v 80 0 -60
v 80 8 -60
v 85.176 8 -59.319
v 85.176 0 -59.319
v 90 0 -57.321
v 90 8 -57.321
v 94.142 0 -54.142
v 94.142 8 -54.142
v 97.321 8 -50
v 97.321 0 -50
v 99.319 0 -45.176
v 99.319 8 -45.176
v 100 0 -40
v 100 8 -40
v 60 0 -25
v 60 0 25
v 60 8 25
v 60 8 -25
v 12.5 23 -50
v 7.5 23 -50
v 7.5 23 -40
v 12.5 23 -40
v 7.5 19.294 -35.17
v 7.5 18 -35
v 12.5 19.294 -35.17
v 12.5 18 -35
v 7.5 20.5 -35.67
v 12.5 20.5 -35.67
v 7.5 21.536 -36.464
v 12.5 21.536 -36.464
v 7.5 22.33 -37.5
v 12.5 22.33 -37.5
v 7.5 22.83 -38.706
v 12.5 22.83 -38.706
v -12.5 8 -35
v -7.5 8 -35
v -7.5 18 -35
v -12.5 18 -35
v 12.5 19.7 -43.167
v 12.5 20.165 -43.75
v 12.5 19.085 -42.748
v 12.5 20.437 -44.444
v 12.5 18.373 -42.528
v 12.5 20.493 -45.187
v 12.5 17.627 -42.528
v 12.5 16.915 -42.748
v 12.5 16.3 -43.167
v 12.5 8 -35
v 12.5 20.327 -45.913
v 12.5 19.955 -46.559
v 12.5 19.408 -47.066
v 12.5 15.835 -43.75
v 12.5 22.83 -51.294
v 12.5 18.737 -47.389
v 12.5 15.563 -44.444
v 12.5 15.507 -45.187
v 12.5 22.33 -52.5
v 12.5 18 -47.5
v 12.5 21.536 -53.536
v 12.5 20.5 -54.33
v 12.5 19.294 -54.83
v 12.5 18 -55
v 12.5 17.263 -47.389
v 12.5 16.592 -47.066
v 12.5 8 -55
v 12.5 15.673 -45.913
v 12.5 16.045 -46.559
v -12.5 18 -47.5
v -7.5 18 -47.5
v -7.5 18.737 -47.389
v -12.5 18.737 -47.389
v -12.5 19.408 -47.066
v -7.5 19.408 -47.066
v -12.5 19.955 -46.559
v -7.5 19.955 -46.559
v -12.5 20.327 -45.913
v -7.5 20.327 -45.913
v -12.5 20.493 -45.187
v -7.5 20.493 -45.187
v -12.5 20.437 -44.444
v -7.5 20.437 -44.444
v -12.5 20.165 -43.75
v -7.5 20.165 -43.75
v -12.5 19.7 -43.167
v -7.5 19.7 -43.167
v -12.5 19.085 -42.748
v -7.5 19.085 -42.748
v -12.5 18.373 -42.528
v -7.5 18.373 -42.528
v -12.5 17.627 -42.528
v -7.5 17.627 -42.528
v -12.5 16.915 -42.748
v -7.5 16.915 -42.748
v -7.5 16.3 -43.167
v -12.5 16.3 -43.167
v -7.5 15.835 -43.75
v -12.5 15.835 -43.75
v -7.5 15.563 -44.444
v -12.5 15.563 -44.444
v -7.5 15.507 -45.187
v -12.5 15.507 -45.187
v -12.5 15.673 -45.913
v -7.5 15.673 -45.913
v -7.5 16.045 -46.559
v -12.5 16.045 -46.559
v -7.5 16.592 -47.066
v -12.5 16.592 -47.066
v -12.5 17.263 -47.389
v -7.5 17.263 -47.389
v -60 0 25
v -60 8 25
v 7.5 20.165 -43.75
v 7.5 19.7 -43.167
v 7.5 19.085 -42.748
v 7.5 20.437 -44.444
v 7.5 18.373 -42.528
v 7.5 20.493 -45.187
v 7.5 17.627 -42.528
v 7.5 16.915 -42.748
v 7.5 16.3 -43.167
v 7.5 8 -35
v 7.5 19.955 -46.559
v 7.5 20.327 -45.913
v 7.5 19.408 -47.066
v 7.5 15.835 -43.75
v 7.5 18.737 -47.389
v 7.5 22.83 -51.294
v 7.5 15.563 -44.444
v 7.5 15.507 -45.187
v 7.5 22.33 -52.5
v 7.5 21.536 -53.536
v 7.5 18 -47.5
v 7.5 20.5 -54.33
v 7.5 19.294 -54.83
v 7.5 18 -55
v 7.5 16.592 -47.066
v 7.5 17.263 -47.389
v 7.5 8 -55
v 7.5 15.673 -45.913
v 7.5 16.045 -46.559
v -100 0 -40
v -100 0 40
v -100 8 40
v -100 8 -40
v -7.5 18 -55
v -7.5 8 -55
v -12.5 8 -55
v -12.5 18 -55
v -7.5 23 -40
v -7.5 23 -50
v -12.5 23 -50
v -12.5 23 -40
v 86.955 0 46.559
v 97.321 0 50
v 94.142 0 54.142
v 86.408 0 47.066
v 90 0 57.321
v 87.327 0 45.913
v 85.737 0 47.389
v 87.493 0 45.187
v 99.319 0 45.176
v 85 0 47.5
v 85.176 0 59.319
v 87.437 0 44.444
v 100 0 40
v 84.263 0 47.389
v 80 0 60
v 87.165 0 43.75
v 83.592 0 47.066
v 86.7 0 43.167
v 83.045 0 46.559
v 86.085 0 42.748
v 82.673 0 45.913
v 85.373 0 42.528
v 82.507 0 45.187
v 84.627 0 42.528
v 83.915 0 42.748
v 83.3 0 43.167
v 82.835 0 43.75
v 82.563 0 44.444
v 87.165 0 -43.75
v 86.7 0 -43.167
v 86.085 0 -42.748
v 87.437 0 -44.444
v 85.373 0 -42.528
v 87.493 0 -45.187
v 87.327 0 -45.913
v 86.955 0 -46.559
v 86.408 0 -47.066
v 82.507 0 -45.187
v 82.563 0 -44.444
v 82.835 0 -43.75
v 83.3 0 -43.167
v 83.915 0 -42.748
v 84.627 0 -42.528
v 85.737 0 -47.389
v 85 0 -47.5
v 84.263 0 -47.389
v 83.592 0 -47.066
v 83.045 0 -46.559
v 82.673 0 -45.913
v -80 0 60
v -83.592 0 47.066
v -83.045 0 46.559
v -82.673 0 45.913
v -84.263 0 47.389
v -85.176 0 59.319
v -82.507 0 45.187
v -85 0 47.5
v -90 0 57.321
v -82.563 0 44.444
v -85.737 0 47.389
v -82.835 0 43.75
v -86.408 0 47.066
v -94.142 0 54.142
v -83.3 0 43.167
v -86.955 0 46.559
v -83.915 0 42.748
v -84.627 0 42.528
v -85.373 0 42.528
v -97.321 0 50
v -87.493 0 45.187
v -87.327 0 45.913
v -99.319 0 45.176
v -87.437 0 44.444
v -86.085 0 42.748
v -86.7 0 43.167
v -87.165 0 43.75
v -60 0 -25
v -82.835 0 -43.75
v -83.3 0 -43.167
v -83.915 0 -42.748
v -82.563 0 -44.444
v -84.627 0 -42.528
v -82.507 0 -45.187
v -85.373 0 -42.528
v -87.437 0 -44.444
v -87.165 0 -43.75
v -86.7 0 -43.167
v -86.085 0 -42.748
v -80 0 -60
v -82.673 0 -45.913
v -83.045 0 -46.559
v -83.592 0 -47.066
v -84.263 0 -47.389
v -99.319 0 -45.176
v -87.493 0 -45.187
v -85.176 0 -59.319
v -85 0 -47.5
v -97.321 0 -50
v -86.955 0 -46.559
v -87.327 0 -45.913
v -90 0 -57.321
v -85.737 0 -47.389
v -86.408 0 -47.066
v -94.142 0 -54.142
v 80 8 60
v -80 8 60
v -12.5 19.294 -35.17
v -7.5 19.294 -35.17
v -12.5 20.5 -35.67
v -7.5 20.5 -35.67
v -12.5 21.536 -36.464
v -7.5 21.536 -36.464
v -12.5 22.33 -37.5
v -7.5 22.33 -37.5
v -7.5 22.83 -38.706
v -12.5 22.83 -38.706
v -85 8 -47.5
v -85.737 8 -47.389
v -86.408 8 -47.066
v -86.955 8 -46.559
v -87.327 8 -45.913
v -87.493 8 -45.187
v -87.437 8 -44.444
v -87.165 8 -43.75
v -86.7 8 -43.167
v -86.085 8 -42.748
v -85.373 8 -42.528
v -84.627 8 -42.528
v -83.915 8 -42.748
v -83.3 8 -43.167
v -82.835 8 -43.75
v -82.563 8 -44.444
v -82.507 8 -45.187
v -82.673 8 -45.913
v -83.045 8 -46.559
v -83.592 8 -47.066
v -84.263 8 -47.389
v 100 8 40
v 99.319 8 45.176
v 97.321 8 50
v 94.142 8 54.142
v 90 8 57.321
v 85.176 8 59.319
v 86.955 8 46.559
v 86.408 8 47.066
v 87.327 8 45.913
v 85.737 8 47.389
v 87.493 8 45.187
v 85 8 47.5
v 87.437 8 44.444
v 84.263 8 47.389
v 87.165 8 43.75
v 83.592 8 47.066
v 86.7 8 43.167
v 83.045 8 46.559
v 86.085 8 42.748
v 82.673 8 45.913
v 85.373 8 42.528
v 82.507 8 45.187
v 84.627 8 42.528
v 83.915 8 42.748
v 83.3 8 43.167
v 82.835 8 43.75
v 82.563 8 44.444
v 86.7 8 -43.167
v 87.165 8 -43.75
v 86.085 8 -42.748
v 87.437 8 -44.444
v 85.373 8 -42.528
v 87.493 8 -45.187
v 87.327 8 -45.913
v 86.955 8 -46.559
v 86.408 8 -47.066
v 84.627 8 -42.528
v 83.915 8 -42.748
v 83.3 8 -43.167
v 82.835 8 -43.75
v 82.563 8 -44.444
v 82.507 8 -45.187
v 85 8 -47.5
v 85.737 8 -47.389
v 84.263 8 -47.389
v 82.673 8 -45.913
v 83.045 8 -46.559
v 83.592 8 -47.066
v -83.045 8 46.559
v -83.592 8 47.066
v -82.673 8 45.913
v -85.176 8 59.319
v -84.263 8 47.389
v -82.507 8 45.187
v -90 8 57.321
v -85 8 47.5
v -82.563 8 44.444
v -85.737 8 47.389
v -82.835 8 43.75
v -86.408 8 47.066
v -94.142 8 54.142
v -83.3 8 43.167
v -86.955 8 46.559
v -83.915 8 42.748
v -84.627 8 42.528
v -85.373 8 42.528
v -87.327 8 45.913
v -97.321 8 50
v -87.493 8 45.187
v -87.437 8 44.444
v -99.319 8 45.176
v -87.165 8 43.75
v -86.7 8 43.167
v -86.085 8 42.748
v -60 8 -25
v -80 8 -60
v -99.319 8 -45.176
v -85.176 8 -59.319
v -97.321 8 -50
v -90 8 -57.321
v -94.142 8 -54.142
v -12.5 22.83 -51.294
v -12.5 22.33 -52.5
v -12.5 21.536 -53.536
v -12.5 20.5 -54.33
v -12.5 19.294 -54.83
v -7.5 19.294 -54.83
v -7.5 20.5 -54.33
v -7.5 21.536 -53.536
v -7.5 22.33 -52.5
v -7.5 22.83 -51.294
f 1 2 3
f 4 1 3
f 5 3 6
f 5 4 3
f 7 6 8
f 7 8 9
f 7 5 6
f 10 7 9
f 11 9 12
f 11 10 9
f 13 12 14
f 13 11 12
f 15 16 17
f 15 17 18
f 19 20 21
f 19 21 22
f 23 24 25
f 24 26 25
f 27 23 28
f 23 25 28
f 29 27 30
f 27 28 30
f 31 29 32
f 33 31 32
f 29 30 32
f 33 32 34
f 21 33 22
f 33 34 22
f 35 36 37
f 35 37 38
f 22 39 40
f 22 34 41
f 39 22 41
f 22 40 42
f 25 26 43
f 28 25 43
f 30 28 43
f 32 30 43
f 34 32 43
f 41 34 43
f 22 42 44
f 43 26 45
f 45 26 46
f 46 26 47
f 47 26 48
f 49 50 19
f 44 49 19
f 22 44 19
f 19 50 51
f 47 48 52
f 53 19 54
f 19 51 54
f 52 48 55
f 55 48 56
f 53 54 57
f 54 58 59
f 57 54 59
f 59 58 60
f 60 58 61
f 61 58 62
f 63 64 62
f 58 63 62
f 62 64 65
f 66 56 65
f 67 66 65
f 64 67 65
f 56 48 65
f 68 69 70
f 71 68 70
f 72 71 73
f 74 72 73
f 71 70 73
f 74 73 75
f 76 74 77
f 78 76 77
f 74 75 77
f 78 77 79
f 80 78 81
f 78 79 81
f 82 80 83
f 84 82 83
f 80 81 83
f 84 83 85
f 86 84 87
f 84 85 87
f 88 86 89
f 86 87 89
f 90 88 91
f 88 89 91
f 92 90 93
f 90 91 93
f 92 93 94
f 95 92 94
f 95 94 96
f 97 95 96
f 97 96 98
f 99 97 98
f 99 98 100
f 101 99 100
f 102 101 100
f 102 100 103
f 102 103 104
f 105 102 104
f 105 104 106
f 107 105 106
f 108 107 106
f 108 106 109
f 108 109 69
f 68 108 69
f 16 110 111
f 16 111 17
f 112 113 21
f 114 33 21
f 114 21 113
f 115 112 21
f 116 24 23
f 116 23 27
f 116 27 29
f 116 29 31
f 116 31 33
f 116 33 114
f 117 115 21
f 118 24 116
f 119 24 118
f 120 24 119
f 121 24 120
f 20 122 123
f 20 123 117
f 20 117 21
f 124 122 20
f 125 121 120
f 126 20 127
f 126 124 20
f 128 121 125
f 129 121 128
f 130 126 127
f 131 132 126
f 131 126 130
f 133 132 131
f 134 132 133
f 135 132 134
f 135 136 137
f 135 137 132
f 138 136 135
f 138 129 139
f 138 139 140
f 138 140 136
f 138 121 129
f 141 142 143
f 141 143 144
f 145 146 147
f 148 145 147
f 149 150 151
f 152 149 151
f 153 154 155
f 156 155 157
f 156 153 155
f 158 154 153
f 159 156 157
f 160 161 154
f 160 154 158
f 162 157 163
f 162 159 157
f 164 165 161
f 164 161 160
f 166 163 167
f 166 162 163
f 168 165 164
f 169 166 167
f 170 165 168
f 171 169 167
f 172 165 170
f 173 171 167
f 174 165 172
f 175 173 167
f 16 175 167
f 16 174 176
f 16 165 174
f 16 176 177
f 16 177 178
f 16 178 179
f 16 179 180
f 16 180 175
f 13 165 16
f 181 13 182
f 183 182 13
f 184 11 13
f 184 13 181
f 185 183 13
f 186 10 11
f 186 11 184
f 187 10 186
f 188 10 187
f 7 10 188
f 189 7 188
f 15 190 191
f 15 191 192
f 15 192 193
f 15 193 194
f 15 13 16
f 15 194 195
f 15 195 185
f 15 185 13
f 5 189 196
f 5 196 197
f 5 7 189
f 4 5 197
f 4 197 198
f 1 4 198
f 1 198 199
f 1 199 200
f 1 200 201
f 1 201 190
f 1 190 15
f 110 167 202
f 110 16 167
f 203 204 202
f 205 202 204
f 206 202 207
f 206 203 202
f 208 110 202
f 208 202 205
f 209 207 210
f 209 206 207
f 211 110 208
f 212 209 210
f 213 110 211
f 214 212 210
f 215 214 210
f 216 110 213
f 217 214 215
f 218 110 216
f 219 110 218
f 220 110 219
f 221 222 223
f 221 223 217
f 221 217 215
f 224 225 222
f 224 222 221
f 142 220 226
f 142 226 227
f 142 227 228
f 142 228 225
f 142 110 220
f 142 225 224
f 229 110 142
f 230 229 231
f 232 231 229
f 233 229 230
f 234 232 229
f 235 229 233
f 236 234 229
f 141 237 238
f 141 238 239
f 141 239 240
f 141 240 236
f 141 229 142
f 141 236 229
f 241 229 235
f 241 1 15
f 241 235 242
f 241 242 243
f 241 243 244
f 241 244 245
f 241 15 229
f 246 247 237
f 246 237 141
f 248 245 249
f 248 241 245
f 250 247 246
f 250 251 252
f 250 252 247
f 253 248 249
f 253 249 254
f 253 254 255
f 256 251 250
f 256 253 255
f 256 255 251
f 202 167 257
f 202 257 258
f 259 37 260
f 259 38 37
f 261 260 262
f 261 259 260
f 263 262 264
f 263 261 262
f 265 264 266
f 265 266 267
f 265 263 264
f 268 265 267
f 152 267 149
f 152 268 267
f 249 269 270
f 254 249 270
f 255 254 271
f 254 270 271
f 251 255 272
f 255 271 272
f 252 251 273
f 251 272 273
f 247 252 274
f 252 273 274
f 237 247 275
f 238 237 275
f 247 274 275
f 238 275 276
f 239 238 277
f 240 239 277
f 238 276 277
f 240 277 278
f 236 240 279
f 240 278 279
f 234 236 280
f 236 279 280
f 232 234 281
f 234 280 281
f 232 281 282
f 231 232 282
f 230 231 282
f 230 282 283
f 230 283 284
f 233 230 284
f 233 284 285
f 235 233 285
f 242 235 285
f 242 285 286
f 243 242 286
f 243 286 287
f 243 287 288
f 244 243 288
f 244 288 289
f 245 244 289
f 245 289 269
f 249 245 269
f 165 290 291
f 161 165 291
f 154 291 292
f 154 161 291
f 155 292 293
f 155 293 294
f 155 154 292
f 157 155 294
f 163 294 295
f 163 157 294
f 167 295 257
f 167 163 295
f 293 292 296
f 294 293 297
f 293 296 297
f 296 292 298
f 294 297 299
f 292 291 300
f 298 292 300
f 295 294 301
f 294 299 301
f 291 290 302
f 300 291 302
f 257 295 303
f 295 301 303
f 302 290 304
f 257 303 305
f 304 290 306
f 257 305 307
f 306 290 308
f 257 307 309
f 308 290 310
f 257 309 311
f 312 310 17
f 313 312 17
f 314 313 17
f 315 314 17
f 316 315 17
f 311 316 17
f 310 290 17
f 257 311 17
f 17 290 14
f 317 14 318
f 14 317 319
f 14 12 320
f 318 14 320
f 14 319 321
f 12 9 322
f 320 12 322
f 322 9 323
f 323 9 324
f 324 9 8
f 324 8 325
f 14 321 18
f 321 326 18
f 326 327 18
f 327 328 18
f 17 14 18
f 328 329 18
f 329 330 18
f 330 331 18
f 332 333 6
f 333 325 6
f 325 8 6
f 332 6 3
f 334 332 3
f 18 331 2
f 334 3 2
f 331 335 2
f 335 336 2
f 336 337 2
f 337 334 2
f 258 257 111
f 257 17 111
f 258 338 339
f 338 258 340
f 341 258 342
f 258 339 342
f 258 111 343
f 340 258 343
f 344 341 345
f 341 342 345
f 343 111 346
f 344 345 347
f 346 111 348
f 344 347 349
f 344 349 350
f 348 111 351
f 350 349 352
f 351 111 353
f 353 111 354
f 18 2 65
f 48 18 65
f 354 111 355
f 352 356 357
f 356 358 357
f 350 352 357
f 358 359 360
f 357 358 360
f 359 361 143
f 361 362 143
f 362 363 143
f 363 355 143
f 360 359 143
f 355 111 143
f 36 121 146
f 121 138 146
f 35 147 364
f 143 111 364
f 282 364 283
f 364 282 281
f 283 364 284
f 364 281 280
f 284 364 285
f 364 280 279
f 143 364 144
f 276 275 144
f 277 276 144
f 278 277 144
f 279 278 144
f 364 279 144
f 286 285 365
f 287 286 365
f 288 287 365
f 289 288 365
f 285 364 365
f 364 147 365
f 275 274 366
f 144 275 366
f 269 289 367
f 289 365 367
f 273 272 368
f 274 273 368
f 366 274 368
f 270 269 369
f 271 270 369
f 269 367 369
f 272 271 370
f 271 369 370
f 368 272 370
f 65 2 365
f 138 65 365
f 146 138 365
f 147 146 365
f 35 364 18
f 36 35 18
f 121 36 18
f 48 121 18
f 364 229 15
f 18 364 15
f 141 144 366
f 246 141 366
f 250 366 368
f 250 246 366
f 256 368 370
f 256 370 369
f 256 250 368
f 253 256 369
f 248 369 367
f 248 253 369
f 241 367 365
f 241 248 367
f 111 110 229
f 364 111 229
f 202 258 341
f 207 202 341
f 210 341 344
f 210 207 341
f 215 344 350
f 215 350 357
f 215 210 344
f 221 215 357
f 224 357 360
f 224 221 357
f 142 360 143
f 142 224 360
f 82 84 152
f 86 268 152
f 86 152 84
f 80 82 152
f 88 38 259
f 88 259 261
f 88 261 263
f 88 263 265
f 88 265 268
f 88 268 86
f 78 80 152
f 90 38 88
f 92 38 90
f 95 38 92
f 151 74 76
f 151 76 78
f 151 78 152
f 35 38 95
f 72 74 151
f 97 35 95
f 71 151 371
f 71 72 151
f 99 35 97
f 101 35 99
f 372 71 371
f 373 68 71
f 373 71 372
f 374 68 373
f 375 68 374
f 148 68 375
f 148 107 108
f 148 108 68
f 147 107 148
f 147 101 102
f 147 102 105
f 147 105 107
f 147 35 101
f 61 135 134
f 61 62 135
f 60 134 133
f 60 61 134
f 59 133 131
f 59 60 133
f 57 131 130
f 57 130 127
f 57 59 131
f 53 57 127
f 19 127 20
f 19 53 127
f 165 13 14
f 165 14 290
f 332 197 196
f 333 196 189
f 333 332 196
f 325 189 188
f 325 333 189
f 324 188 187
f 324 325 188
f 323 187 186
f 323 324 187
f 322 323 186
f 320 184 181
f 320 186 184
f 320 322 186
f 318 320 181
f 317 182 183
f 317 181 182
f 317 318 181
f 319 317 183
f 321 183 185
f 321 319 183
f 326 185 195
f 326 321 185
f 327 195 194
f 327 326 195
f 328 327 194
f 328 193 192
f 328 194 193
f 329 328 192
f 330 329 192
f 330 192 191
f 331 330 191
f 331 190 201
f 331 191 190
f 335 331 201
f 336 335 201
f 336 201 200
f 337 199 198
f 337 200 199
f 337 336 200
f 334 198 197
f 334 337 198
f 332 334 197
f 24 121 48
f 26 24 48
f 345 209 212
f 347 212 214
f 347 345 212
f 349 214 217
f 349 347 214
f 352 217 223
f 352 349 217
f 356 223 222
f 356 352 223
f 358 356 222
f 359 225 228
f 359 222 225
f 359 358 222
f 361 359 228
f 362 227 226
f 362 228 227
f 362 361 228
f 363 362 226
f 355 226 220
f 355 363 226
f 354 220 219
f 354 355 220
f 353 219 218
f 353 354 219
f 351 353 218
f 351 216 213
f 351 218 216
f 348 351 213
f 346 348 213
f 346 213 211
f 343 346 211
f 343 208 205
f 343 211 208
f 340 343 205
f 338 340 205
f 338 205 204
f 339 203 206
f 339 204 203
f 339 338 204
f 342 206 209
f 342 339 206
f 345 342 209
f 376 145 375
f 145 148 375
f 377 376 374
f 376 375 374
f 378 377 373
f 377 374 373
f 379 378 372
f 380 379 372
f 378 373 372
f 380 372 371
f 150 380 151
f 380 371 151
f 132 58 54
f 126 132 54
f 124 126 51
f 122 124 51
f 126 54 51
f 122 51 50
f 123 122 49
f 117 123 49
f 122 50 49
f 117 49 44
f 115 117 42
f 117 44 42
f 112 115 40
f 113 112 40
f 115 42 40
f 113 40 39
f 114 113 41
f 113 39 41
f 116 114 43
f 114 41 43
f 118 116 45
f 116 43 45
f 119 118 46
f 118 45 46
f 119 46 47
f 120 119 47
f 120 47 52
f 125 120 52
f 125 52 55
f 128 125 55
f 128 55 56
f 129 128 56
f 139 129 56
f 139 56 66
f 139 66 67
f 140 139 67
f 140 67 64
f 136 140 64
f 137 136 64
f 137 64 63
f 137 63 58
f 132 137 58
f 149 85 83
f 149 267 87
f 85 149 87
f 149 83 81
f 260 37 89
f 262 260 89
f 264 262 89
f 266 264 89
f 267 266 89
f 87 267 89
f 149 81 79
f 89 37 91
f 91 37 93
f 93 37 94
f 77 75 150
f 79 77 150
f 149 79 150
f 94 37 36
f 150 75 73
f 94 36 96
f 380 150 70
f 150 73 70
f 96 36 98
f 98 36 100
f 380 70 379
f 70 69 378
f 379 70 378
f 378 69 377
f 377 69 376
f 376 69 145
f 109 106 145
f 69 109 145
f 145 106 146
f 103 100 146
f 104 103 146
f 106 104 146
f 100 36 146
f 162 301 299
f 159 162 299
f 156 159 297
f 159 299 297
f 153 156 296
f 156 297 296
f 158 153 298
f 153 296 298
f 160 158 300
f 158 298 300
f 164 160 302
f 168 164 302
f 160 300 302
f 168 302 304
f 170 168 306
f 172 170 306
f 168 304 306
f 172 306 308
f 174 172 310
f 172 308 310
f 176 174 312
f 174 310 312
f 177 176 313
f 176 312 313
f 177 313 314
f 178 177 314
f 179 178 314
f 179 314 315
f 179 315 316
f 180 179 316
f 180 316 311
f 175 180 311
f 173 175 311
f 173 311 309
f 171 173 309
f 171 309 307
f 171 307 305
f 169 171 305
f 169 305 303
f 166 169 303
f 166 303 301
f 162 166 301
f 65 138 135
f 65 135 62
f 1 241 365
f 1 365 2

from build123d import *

# Parameters (mm, degrees)
SKETCH1_W               = 120
SKETCH1_H               = 50
BOSS_EXTRUDE1_DEPTH     = 8
SKETCH2_R               = 2.5
CUT_EXTRUDE1_DEPTH      = 10
MIRROR2_COPY_1_SKETCH_R = 2.5
MIRROR2_COPY_1_DEPTH    = 10
SKETCH4_W               = 5
SKETCH4_H               = 20
BOSS_EXTRUDE2_DEPTH     = 15
FILLET1_R               = 5
FILLET1_OF_MIRROR4_R    = 5
SKETCH5_R               = 2.5
CUT_EXTRUDE2_DEPTH      = 54


with BuildPart() as part:
    # Sketch1 → Boss-Extrude1 (new body)
    with BuildSketch(Plane(origin=(0, 0, 0), x_dir=(1, 0, 0), z_dir=(0, 1, 0))):
        with BuildLine():
            Line((-80, 60), (80, 60))
            ThreePointArc((80, 60), (94.142135624, 54.142135624), (100, 40))
            Line((100, 40), (100, -40))
            ThreePointArc((100, -40), (94.142135624, -54.142135624), (80, -60))
            Line((80, -60), (-80, -60))
            ThreePointArc((-80, -60), (-94.142135624, -54.142135624), (-100, -40))
            Line((-100, -40), (-100, 40))
            ThreePointArc((-100, 40), (-94.142135624, 54.142135624), (-80, 60))
        make_face()
        Rectangle(SKETCH1_W, SKETCH1_H, mode=Mode.SUBTRACT)
    extrude(amount=BOSS_EXTRUDE1_DEPTH)

    # Sketch2 → Cut-Extrude1 (cut)
    with BuildSketch(Plane(origin=(0, 8, 0), x_dir=(1, 0, 0), z_dir=(0, 1, 0))):
        with Locations(Location((85, -45, 0), (0, 0, 270))):
            Circle(SKETCH2_R)
    cut_extrude1 = extrude(amount=-CUT_EXTRUDE1_DEPTH, mode=Mode.SUBTRACT)

    # Mirror1: Cut-Extrude1 across plane
    add(cut_extrude1.mirror(Plane(origin=(0, 0, 0), x_dir=(0, 0, 1), z_dir=(1, 0, 0))), mode=Mode.SUBTRACT)

    # Mirror2: Cut-Extrude1 across plane
    add(cut_extrude1.mirror(Plane.XY), mode=Mode.SUBTRACT)

    # Mirror2 copy 1 sketch → Mirror2 copy 1 (cut)
    with BuildSketch(Plane(origin=(0, 8, 0), x_dir=(-1, 0, 0), z_dir=(0, 1, 0))):
        with Locations(Location((85, -45, 0), (0, 0, 270))):
            Circle(MIRROR2_COPY_1_SKETCH_R)
    extrude(amount=-MIRROR2_COPY_1_DEPTH, mode=Mode.SUBTRACT)

    # Sketch4 → Boss-Extrude2 (add)
    with BuildSketch(Plane(origin=(0, 8, 0), x_dir=(1, 0, 0), z_dir=(0, 1, 0))):
        with Locations((10, 45)):
            Rectangle(SKETCH4_W, SKETCH4_H)
    boss_extrude2 = extrude(amount=BOSS_EXTRUDE2_DEPTH)

    # Fillet1
    fillet1_edges = [part.edges().sort_by_distance(p)[0] for p in [
        (10, 23, -55),
        (10, 23, -35),
    ]]
    fillet(fillet1_edges, radius=FILLET1_R)

    # Mirror4: Boss-Extrude2 across plane
    add(boss_extrude2.mirror(Plane(origin=(0, 0, 0), x_dir=(0, 0, 1), z_dir=(1, 0, 0))))

    # Fillet1 of Mirror4
    fillet1_of_mirror4_edges = [part.edges().sort_by_distance(p)[0] for p in [
        (-10, 23, -55),
        (-10, 23, -35),
    ]]
    fillet(fillet1_of_mirror4_edges, radius=FILLET1_OF_MIRROR4_R)

    # Sketch5 → Cut-Extrude2 (cut)
    with BuildSketch(Plane(origin=(12.5, 0, 0), x_dir=(0, 0, -1), z_dir=(1, 0, 0))):
        with Locations((45, 18)):
            Circle(SKETCH5_R)
    extrude(amount=-CUT_EXTRUDE2_DEPTH, mode=Mode.SUBTRACT)


solid = part.part
